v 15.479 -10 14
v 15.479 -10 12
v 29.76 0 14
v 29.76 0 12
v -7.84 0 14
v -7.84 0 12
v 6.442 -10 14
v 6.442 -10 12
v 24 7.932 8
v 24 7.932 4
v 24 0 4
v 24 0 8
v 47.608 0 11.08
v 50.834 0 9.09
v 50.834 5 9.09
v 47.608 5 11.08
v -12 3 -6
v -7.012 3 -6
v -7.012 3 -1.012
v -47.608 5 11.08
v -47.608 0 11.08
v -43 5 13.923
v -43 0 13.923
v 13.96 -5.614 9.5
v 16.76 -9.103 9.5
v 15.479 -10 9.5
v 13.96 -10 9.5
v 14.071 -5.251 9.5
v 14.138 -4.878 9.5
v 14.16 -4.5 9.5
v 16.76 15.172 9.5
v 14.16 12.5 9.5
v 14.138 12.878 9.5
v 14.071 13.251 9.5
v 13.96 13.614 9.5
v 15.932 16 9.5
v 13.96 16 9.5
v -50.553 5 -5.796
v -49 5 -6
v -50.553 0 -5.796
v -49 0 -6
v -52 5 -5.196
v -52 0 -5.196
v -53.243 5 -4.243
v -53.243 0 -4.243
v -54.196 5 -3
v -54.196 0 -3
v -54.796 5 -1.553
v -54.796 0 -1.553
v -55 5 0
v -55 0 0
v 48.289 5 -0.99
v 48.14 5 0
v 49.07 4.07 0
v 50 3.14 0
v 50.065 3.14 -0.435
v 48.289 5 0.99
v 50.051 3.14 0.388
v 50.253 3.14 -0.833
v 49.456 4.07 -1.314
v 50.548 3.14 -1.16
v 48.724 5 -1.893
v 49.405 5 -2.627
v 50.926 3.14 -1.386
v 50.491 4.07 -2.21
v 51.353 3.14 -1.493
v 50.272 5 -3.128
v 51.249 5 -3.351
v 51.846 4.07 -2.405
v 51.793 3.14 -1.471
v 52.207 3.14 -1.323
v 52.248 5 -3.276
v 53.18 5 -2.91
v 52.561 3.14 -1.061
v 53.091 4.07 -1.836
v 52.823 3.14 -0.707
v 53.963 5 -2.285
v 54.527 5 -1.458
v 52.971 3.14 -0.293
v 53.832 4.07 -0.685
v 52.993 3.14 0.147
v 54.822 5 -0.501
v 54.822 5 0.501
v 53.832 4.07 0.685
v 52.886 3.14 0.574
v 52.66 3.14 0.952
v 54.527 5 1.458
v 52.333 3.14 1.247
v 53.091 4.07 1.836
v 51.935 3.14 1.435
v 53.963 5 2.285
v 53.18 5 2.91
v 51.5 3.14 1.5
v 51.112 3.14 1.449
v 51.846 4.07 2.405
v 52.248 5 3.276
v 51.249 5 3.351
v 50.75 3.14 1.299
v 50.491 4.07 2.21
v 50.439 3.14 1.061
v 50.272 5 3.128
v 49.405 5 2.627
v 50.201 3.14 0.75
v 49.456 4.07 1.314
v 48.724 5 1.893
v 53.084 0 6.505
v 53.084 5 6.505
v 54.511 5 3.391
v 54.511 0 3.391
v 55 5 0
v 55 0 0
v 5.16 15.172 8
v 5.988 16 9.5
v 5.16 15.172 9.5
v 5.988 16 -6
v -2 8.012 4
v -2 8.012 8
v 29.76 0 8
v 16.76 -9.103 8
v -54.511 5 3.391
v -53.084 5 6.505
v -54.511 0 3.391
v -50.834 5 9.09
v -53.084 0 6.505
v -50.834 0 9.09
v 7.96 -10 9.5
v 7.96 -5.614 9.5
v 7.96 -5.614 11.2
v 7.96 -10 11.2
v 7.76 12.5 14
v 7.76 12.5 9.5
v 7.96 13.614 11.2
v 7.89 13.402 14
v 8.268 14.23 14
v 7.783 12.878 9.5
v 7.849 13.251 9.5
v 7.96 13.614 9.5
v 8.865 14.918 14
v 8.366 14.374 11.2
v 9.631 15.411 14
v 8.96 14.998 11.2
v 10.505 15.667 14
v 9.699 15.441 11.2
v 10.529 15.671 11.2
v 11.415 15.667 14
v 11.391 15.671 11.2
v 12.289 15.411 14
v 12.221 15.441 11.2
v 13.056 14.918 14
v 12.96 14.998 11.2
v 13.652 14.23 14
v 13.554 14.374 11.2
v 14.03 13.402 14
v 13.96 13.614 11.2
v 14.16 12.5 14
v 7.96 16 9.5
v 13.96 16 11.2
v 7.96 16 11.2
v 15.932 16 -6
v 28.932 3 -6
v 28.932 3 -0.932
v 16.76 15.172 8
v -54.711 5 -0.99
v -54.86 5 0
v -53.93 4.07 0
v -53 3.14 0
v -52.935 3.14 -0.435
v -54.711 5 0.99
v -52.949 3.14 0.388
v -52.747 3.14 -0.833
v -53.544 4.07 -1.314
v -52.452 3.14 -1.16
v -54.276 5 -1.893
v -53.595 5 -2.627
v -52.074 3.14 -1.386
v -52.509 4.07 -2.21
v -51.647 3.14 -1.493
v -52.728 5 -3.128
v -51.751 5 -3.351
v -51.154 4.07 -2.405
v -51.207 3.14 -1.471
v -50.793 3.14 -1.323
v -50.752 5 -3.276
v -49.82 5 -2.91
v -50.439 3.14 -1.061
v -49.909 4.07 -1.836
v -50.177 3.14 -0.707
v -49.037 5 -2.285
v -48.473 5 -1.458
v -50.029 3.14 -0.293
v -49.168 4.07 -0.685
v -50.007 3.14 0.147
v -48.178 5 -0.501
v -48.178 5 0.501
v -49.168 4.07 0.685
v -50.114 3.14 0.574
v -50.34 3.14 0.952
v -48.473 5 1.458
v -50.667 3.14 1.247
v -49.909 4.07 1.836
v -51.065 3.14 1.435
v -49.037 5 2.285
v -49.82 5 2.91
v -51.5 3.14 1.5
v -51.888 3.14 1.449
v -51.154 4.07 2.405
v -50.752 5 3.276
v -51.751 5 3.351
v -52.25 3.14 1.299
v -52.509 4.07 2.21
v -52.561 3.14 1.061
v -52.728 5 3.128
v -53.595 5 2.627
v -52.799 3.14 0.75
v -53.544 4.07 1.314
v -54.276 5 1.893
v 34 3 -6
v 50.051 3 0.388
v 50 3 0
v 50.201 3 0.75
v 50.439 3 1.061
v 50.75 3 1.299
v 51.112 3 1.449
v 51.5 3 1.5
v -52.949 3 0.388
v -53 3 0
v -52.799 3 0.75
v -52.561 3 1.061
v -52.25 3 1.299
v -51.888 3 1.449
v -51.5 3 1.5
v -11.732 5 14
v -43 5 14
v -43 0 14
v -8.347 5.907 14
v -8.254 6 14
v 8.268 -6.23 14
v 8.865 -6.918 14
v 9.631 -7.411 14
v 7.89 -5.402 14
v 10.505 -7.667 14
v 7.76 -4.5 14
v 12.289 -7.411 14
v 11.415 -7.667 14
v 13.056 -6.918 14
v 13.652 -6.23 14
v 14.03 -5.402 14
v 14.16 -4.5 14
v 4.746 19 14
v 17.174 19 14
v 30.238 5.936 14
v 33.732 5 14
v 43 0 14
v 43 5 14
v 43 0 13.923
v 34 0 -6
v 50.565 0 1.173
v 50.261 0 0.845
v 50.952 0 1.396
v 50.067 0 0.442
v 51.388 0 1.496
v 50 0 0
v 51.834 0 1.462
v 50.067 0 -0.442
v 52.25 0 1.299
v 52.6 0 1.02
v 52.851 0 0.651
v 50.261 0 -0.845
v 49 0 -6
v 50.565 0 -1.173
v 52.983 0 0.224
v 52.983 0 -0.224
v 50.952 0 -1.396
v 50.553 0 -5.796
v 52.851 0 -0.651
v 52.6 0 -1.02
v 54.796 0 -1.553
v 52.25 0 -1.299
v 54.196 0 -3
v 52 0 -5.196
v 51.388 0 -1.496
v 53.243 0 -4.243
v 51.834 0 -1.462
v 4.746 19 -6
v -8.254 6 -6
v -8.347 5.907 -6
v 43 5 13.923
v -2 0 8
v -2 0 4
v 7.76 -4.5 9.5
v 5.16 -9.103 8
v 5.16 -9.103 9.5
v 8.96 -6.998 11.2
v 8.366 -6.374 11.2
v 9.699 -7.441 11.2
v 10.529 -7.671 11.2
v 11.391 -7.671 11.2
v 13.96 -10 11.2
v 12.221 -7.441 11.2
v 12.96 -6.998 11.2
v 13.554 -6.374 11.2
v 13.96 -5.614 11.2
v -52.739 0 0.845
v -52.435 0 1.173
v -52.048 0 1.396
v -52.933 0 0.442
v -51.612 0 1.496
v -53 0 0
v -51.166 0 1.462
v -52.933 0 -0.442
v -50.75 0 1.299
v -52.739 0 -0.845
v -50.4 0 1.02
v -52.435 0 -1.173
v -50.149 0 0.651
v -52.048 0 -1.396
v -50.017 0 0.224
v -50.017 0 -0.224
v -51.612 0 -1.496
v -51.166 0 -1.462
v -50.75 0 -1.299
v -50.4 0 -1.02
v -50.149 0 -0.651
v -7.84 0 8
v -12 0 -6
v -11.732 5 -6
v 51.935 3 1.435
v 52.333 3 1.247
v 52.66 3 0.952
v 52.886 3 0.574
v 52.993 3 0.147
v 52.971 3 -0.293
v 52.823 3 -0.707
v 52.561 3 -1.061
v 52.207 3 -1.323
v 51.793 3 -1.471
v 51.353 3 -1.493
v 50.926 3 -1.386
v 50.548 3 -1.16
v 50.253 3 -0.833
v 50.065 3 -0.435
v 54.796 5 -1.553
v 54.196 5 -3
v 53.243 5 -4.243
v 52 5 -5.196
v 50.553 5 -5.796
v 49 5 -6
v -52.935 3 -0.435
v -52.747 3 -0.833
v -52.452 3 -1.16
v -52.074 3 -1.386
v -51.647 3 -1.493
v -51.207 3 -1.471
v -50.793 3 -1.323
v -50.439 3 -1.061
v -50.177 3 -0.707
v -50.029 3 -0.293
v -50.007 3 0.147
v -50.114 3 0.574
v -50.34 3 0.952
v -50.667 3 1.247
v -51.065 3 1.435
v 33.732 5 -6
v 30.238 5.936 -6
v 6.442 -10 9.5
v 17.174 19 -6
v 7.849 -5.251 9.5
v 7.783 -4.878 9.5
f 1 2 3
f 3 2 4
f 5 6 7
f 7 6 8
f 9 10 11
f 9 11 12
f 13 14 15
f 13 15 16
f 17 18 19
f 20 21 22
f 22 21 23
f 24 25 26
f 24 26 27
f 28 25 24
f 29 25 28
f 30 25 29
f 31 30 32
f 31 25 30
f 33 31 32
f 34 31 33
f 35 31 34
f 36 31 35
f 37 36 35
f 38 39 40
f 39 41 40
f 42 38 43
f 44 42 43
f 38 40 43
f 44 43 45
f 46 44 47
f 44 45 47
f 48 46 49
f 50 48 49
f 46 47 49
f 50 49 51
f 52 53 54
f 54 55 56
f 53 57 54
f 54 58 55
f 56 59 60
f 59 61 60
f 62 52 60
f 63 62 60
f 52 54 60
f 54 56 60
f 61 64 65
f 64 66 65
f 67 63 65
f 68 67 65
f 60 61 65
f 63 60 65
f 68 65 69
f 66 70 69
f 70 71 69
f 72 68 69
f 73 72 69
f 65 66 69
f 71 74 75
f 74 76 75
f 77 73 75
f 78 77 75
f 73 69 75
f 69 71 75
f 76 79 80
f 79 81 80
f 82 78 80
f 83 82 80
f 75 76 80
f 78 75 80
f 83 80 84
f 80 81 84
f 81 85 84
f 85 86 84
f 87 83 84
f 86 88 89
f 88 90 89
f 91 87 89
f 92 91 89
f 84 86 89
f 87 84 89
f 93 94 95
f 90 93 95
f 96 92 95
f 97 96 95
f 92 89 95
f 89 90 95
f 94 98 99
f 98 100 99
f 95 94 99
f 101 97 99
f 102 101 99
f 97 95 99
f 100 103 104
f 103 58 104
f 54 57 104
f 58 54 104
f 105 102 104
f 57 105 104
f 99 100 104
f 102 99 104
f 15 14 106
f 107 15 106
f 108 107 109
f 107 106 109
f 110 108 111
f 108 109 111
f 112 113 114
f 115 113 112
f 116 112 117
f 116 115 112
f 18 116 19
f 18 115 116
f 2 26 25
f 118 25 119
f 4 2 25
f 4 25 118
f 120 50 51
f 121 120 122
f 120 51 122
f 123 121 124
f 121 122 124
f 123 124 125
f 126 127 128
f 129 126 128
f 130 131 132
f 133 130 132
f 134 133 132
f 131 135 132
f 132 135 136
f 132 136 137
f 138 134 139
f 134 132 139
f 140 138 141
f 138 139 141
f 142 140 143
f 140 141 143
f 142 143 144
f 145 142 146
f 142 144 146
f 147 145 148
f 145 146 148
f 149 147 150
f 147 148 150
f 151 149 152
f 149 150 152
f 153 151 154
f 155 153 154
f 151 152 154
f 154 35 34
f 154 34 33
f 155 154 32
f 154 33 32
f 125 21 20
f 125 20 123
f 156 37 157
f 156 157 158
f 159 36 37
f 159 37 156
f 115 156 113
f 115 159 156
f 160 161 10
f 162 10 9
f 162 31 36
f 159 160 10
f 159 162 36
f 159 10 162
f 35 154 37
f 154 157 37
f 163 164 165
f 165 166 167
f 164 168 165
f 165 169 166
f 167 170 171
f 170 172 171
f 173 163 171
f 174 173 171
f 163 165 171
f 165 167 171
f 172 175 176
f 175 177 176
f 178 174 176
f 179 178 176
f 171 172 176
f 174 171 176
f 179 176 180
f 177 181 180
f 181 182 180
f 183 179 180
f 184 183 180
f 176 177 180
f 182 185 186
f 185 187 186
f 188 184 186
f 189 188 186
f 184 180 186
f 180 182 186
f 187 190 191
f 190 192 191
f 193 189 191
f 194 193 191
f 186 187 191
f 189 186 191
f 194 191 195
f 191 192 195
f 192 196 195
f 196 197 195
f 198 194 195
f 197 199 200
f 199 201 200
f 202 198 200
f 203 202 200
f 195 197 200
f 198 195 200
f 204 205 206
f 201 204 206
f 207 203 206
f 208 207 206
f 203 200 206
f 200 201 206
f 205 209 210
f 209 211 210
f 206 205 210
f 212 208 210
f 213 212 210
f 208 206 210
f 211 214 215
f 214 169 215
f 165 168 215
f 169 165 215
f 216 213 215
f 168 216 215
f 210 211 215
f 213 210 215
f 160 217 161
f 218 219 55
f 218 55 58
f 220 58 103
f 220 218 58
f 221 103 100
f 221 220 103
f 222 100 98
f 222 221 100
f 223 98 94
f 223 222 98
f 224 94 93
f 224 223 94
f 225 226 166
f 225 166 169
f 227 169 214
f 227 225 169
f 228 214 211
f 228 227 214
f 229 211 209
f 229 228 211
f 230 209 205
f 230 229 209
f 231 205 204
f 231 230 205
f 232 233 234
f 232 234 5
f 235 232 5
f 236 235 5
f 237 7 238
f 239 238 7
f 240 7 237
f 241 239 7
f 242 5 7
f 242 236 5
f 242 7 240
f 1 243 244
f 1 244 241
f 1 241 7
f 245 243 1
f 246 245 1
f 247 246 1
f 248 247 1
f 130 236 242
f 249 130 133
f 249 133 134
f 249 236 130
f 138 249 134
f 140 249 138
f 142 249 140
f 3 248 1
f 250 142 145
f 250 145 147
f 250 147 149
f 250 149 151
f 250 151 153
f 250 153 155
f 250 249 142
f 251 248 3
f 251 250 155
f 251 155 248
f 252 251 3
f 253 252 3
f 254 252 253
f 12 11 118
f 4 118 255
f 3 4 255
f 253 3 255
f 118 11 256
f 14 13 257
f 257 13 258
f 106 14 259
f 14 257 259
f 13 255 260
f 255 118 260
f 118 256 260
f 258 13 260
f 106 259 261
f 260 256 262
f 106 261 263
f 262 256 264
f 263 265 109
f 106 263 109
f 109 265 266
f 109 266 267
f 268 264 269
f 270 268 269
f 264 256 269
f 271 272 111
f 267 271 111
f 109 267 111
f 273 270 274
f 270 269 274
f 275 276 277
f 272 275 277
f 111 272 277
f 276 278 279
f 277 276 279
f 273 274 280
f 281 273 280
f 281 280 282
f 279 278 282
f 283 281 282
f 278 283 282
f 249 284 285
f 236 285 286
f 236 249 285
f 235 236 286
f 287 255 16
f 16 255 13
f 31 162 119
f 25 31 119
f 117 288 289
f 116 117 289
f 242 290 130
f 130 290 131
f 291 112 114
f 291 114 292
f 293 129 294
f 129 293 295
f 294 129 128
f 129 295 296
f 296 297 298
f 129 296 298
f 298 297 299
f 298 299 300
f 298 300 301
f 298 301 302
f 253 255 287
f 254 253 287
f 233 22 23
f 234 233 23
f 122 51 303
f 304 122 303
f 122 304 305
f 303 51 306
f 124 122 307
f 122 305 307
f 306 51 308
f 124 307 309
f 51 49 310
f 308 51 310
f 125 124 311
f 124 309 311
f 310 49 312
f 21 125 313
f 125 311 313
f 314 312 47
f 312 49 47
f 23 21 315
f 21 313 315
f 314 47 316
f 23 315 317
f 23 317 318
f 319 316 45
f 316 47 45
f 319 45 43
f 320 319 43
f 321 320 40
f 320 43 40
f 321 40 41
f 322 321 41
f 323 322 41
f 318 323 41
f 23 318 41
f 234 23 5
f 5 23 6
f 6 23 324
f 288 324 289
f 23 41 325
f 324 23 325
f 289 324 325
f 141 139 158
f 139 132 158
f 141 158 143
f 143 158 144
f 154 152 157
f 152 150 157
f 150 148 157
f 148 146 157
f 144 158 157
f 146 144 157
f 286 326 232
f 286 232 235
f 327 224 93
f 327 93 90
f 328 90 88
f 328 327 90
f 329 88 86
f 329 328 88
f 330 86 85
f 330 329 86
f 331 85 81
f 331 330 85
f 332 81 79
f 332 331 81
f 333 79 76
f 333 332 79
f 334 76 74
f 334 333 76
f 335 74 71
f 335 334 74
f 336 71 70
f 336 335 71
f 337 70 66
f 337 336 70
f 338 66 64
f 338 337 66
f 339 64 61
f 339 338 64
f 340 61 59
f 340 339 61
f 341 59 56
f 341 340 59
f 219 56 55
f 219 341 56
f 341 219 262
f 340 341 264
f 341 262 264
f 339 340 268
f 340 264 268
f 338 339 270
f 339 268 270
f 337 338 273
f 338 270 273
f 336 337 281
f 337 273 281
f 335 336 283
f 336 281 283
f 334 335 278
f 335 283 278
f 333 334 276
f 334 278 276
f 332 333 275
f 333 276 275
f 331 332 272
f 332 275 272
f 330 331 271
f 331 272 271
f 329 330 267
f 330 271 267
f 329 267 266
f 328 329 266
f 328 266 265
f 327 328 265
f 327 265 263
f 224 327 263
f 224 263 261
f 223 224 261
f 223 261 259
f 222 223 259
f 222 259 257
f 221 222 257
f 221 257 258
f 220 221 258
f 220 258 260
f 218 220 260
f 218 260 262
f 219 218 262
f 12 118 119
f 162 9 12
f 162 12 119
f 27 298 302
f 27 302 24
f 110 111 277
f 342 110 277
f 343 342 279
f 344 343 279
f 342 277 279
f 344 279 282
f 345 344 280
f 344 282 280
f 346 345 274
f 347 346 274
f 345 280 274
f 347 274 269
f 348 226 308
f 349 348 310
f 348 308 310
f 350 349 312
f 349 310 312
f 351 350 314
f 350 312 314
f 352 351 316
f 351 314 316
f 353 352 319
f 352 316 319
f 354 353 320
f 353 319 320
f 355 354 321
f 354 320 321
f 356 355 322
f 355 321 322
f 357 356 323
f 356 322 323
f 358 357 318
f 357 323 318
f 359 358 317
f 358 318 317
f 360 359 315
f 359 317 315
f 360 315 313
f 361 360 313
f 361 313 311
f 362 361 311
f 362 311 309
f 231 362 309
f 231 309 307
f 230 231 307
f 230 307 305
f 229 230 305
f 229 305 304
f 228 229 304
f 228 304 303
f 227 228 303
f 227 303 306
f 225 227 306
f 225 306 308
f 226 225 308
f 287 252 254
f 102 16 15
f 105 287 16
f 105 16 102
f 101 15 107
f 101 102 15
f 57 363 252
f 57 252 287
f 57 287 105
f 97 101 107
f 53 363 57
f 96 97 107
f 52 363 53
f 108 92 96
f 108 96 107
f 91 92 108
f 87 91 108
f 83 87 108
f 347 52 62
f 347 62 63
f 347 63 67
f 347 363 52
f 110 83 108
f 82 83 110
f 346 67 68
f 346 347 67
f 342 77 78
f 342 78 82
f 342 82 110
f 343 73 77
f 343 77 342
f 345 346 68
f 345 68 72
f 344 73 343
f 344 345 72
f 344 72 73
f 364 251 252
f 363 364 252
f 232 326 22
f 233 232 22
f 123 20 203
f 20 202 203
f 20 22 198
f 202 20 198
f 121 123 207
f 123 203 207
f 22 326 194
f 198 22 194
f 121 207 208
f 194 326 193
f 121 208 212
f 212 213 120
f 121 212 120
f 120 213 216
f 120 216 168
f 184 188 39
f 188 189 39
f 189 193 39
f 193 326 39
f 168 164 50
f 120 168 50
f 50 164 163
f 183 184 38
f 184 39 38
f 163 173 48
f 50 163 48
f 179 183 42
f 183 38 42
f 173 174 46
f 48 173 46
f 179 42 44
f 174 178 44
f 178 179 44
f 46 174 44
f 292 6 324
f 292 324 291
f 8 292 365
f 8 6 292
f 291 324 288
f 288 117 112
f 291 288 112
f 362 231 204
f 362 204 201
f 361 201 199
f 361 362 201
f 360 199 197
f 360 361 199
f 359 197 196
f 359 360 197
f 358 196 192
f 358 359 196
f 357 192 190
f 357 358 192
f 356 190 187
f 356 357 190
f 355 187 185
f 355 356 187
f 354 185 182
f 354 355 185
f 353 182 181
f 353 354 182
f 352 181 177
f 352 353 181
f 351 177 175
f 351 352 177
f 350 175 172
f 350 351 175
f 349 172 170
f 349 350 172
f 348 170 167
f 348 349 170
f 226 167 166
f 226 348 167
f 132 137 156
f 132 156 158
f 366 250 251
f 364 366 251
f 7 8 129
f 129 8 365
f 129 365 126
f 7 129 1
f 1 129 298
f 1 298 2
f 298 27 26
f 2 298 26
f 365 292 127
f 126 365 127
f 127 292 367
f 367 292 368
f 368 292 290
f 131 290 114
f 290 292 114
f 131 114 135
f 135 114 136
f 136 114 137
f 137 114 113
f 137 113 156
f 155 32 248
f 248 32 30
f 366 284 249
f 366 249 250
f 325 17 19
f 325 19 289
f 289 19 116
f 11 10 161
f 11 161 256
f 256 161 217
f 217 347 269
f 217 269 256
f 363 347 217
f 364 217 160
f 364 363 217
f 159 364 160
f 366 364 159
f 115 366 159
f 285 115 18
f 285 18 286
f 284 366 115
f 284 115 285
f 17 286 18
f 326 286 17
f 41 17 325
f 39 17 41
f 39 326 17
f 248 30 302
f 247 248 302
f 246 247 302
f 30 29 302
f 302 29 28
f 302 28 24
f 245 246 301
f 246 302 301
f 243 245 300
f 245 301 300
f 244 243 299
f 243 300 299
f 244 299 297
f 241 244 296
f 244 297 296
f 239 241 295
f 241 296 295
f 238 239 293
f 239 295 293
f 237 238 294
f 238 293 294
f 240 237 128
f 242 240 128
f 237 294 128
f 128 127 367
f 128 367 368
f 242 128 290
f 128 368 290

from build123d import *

# Parameters (mm, degrees)
BOSS_EXTRUDE1_DEPTH           = 3
CUT_EXTRUDE1_DEPTH            = 10
CUT_EXTRUDE3_START            = 8
SKETCH8_W                     = 6
SKETCH8_H                     = 3
CUT_EXTRUDE3_DEPTH            = 6
BOSS_EXTRUDE4_START           = 18
BOSS_EXTRUDE4_DEPTH           = 28
BOSS_EXTRUDE5_DEPTH           = 3
CUT_EXTRUDE4_DEPTH            = 3
CUT_EXTRUDE5_DEPTH            = 10
SKETCH18_R                    = 1.5
BOSS_EXTRUDE9_DEPTH           = 2
CHAMFER1_SIZE                 = 15
CHAMFER2_SIZE                 = 15
CHAMFER2_SIZE_2               = 10.503113073
CUT_EXTRUDE6_DEPTH            = 5
BOSS_EXTRUDE8_DEPTH           = 2
CHAMFER3_DEPTH                = 6
CHAMFER3_2_DEPTH              = 5
CSK_FOR_M3_SFHCS1_D           = 3
CSK_FOR_M3_SFHCS1_DEPTH       = 31.098709071
CSK_FOR_M3_SFHCS1_CSINK_D     = 6.72
CSK_FOR_M3_SFHCS1_CSINK_ANGLE = 90
CSK_FOR_M3_SFHCS1_TIP         = 0.901290929
CUT_EXTRUDE7_DEPTH            = 1.5
BOSS_EXTRUDE10_START          = -6
BOSS_EXTRUDE10_DEPTH          = 20
CHAMFER4_SIZE                 = 1.07179677
CHAMFER4_SIZE_2               = 4


with BuildPart() as part:
    # Sketch1 → Boss-Extrude1 (new body)
    with BuildSketch(Plane(origin=(0, 0, 0), x_dir=(1, 0, 0), z_dir=(0, 1, 0))):
        with BuildLine():
            ThreePointArc((-49, -6), (-53.242640687, -4.242640687), (-55, 0))
            ThreePointArc((-55, 0), (-51.485281374, -8.485281374), (-43, -12))
            Line((-43, -12), (43, -12))
            ThreePointArc((43, -12), (51.485281374, -8.485281374), (55, 0))
            ThreePointArc((55, 0), (53.242640687, -4.242640687), (49, -6))
            Line((49, -6), (-49, -6))
        make_face()
        with BuildLine():
            Line((-53, 0), (-55, 0))
            ThreePointArc((-55, 0), (-53.242640687, -4.242640687), (-49, -6))
            Line((-49, -6), (49, -6))
            ThreePointArc((49, -6), (53.242640687, -4.242640687), (55, 0))
            Line((55, 0), (53, 0))
            ThreePointArc((53, 0), (51.5, -1.5), (50, 0))
            Line((50, 0), (-50, 0))
            ThreePointArc((-50, 0), (-51.5, -1.5), (-53, 0))
        make_face()
        with BuildLine():
            Line((49, 6), (-49, 6))
            ThreePointArc((-49, 6), (-53.242640687, 4.242640687), (-55, 0))
            Line((-55, 0), (-53, 0))
            ThreePointArc((-53, 0), (-51.5, 1.5), (-50, 0))
            Line((-50, 0), (50, 0))
            ThreePointArc((50, 0), (51.5, 1.5), (53, 0))
            Line((53, 0), (55, 0))
            ThreePointArc((55, 0), (53.242640687, 4.242640687), (49, 6))
        make_face()
    extrude(amount=BOSS_EXTRUDE1_DEPTH)

    # Sketch2 → Cut-Extrude1 (cut)
    with BuildSketch(Plane(origin=(0, 3, 0), x_dir=(1, 0, 0), z_dir=(0, 1, 0))):
        Polygon((22, -8), (36, 6), (-14, 6), (0, -8), align=None)
    extrude(amount=-CUT_EXTRUDE1_DEPTH, mode=Mode.SUBTRACT)

    # Sketch8 → Cut-Extrude3 (cut)
    with BuildSketch(Plane.XY.offset(CUT_EXTRUDE3_START)):
        with Locations((10.960071178, 1.5)):
            Rectangle(SKETCH8_W, SKETCH8_H)
    extrude(amount=CUT_EXTRUDE3_DEPTH, mode=Mode.SUBTRACT)


with BuildPart() as cut_extrude3_piece_1:
    # of the separate pieces the step leaves, piece 1, a body of its own (cut_extrude3_pieces)
    add(part.part.solids().sort_by_distance((-55, 0, 0))[0])

    # Sketch9 → Boss-Extrude4 (add)
    with BuildSketch(Plane(origin=(0, 0, 0), x_dir=(1, 0, 0), z_dir=(0, 1, 0)).offset(BOSS_EXTRUDE4_START)):
        Polygon((13.960071178, -11.2), (13.960071178, -8), (14.760071178, -8), (14.760071178, -12), (7.160071178, -12), (7.160071178, -8), (7.960071178, -8), (7.960071178, -11.2), align=None)
    extrude(amount=-BOSS_EXTRUDE4_DEPTH)


with BuildPart() as cut_extrude3_piece_2:
    # of the separate pieces the step leaves, piece 2, a body of its own (cut_extrude3_pieces)
    add(part.part.solids().sort_by_distance((13.960071178, 0, 12))[0])


with BuildPart() as cut_extrude3_piece_1_1:
    add(cut_extrude3_piece_1.part)

    # Combine1: union Cut-Extrude3 piece 2
    add(cut_extrude3_piece_2.part)

    # Sketch11 → Boss-Extrude5 (add)
    with BuildSketch(Plane(origin=(0, 3, 0), x_dir=(1, 0, 0), z_dir=(0, 1, 0))):
        Polygon((-14, 6), (-12, 6), (2, -8), (0, -8), align=None)
        Polygon((20, -8), (34, 6), (36, 6), (22, -8), align=None)
    extrude(amount=-BOSS_EXTRUDE5_DEPTH)

    # Sketch13 → Cut-Extrude4 (cut)
    with BuildSketch(Plane(origin=(0, 3, 0), x_dir=(1, 0, 0), z_dir=(0, 1, 0))):
        Polygon((2, -8), (-2, -8), (-2, -4), align=None)
        Polygon((24, -4), (24, -8), (20, -8), align=None)
    extrude(amount=-CUT_EXTRUDE4_DEPTH, mode=Mode.SUBTRACT)

    # Sketch15 → Cut-Extrude5 (cut)
    with BuildSketch(Plane.XY.offset(12)):
        with BuildLine():
            Line((14.160071178, 12.5), (14.160071178, -4.5))
            ThreePointArc((14.160071178, -4.5), (10.960071178, -7.7), (7.760071178, -4.5))
            Line((7.760071178, -4.5), (7.760071178, 12.5))
            ThreePointArc((7.760071178, 12.5), (10.960071178, 15.7), (14.160071178, 12.5))
        make_face()
    extrude(amount=-CUT_EXTRUDE5_DEPTH, mode=Mode.SUBTRACT)

    # Sketch18 → Boss-Extrude9 (add)
    # profile 1 of 2: a face of its own
    with BuildSketch(Plane(origin=(0, 3, 0), x_dir=(1, 0, 0), z_dir=(0, 1, 0))):
        with BuildLine():
            Line((7.160071178, -8), (-2, -8))
            Line((-2, -8), (-2, -4))
            Line((-2, -4), (-12, 6))
            Line((-12, 6), (-49, 6))
            ThreePointArc((-49, 6), (-53.242640687, 4.242640687), (-55, 0))
            ThreePointArc((-55, 0), (-51.485281374, -8.485281374), (-43, -12))
            Line((-43, -12), (7.160071178, -12))
            Line((7.160071178, -12), (7.160071178, -8))
        make_face()
        with Locations(Location((-51.5, 0, 0), (0, 0, 270))):
            Circle(SKETCH18_R, mode=Mode.SUBTRACT)
    # profile 2 of 2: a face of its own
    with BuildSketch(Plane(origin=(0, 3, 0), x_dir=(1, 0, 0), z_dir=(0, 1, 0))):
        with BuildLine():
            Line((24, -4), (24, -8))
            Line((24, -8), (14.760071178, -8))
            Line((14.760071178, -8), (14.760071178, -12))
            Line((14.760071178, -12), (43, -12))
            ThreePointArc((43, -12), (51.485281374, -8.485281374), (55, 0))
            ThreePointArc((55, 0), (53.242640687, 4.242640687), (49, 6))
            Line((49, 6), (34, 6))
            Line((34, 6), (24, -4))
        make_face()
        with Locations(Location((51.5, 0, 0), (0, 0, 270))):
            Circle(SKETCH18_R, mode=Mode.SUBTRACT)
    extrude(amount=BOSS_EXTRUDE9_DEPTH)

    # Chamfer1
    # the kernel refuses this chamfer: 15 mm, written as the material it adds along each edge
    with BuildSketch(Plane(origin=(14.760071178, 5, 8), x_dir=(0, 1, 0), z_dir=(0, 0, 1))) as chamfer1_piece_1_section:
        Polygon((CHAMFER1_SIZE, 0), (0, -CHAMFER1_SIZE), (0, 0), align=None)
    chamfer1_piece_1 = extrude(amount=4, mode=Mode.PRIVATE)
    chamfer1_piece_1 = split(chamfer1_piece_1, bisect_by=Plane(origin=(14.760071178, 18, 8), z_dir=(0, -1, 0)), keep=Keep.TOP, mode=Mode.PRIVATE)
    chamfer1_piece_1 = split(chamfer1_piece_1, bisect_by=Plane(origin=(17.380035589, 5, 10.619964411), z_dir=(-0.7071067811865474, 0, -0.7071067811865477)), keep=Keep.TOP, mode=Mode.PRIVATE)
    add(chamfer1_piece_1)
    with BuildSketch(Plane(origin=(14.760071178, 5, -30.575244819), x_dir=(0, 1, 0), z_dir=(0, 0, 1))) as chamfer1_piece_2_section:
        Polygon((CHAMFER1_SIZE, 0), (0, -CHAMFER1_SIZE), (0, 0), align=None)
    chamfer1_piece_2 = extrude(amount=42.575244819, mode=Mode.PRIVATE)
    chamfer1_piece_2 = split(chamfer1_piece_2, bisect_by=Plane(origin=(14.760071178, 5, 8), z_dir=(0, 0, -1)), keep=Keep.TOP, mode=Mode.PRIVATE)
    chamfer1_piece_2 = split(chamfer1_piece_2, bisect_by=Plane(origin=(36.667657999, 5, -8.667657999), z_dir=(0.7071067811865474, 0, 0.7071067811865477)), keep=Keep.TOP, mode=Mode.PRIVATE)
    chamfer1_piece_2 = split(chamfer1_piece_2, bisect_by=Plane(origin=(24, 5, -30.575244819), z_dir=(1, 0, 0)), keep=Keep.TOP, mode=Mode.PRIVATE)
    add(chamfer1_piece_2)
    with BuildSketch(Plane(origin=(14.760071178, 5, 8), x_dir=(0, 1, 0), z_dir=(0, 0, 1))) as chamfer1_piece_3_section:
        Polygon((CHAMFER1_SIZE, 0), (0, -CHAMFER1_SIZE), (0, 0), align=None)
    chamfer1_piece_3 = extrude(amount=4, mode=Mode.PRIVATE)
    chamfer1_piece_3 = split(chamfer1_piece_3, bisect_by=Plane(origin=(14.760071178, 18, 8), z_dir=(0, -1, 0)), keep=Keep.TOP, mode=Mode.PRIVATE)
    chamfer1_piece_3 = split(chamfer1_piece_3, bisect_by=Plane(origin=(17.380035589, 5, 10.619964411), z_dir=(0.7071067811865474, 0, 0.7071067811865477)), keep=Keep.TOP, mode=Mode.PRIVATE)
    chamfer1_piece_3 = split(chamfer1_piece_3, bisect_by=Plane(origin=(24, 5, 8), z_dir=(-1, 0, 0)), keep=Keep.TOP, mode=Mode.PRIVATE)
    add(chamfer1_piece_3)
    with BuildSketch(Plane(origin=(14.760071178, 5, 8), x_dir=(0, 1, 0), z_dir=(0, 0, 1))) as chamfer1_piece_4_section:
        Polygon((CHAMFER1_SIZE, 0), (0, -CHAMFER1_SIZE), (0, 0), align=None)
    chamfer1_piece_4 = extrude(amount=4, mode=Mode.PRIVATE)
    chamfer1_piece_4 = split(chamfer1_piece_4, bisect_by=Plane(origin=(24, 5, 8), z_dir=(1, 0, 0)), keep=Keep.TOP, mode=Mode.PRIVATE)
    add(chamfer1_piece_4)
    with BuildSketch(Plane(origin=(7.160071178, 5, 12), x_dir=(0, 1, 0), z_dir=(0, 0, -1))) as chamfer1_piece_5_section:
        Polygon((CHAMFER1_SIZE, 0), (0, -CHAMFER1_SIZE), (0, 0), align=None)
    chamfer1_piece_5 = extrude(amount=4, mode=Mode.PRIVATE)
    chamfer1_piece_5 = split(chamfer1_piece_5, bisect_by=Plane(origin=(6.580035589, 5, 12.580035589), z_dir=(-0.7071067811865489, 0, 0.7071067811865461)), keep=Keep.TOP, mode=Mode.PRIVATE)
    chamfer1_piece_5 = split(chamfer1_piece_5, bisect_by=Plane(origin=(-2, 5, 12), z_dir=(1, 0, 0)), keep=Keep.TOP, mode=Mode.PRIVATE)
    chamfer1_piece_5 = split(chamfer1_piece_5, bisect_by=Plane(origin=(7.160071178, 18, 12), z_dir=(0, -1, 0)), keep=Keep.TOP, mode=Mode.PRIVATE)
    add(chamfer1_piece_5)
    with BuildSketch(Plane(origin=(7.160071178, 5, 12), x_dir=(0, 1, 0), z_dir=(0, 0, -1))) as chamfer1_piece_6_section:
        Polygon((CHAMFER1_SIZE, 0), (0, -CHAMFER1_SIZE), (0, 0), align=None)
    chamfer1_piece_6 = extrude(amount=4, mode=Mode.PRIVATE)
    chamfer1_piece_6 = split(chamfer1_piece_6, bisect_by=Plane(origin=(-2, 5, 12), z_dir=(-1, 0, 0)), keep=Keep.TOP, mode=Mode.PRIVATE)
    add(chamfer1_piece_6)
    with BuildSketch(Plane(origin=(7.160071178, 5, 12), x_dir=(0, 1, 0), z_dir=(0, 0, -1))) as chamfer1_piece_7_section:
        Polygon((CHAMFER1_SIZE, 0), (0, -CHAMFER1_SIZE), (0, 0), align=None)
    chamfer1_piece_7 = extrude(amount=4, mode=Mode.PRIVATE)
    chamfer1_piece_7 = split(chamfer1_piece_7, bisect_by=Plane(origin=(6.580035589, 5, 12.580035589), z_dir=(0.7071067811865489, 0, -0.7071067811865461)), keep=Keep.TOP, mode=Mode.PRIVATE)
    chamfer1_piece_7 = split(chamfer1_piece_7, bisect_by=Plane(origin=(7.160071178, 18, 12), z_dir=(0, -1, 0)), keep=Keep.TOP, mode=Mode.PRIVATE)
    add(chamfer1_piece_7)
    with BuildSketch(Plane(origin=(7.160071178, 5, 12), x_dir=(0, 1, 0), z_dir=(0, 0, -1))) as chamfer1_piece_8_section:
        Polygon((CHAMFER1_SIZE, 0), (0, -CHAMFER1_SIZE), (0, 0), align=None)
    chamfer1_piece_8 = extrude(amount=42.575244819, mode=Mode.PRIVATE)
    chamfer1_piece_8 = split(chamfer1_piece_8, bisect_by=Plane(origin=(6.580035589, 5, 12.580035589), z_dir=(-0.7071067811865489, 0, 0.7071067811865461)), keep=Keep.TOP, mode=Mode.PRIVATE)
    chamfer1_piece_8 = split(chamfer1_piece_8, bisect_by=Plane(origin=(-2, 5, 12), z_dir=(-1, 0, 0)), keep=Keep.TOP, mode=Mode.PRIVATE)
    chamfer1_piece_8 = split(chamfer1_piece_8, bisect_by=Plane(origin=(7.160071178, 5, 8), z_dir=(0, 0, -1)), keep=Keep.TOP, mode=Mode.PRIVATE)
    add(chamfer1_piece_8)

    # Chamfer2
    # the kernel refuses this chamfer: 15, 10.503113073 mm, written as the material it adds along each edge
    with BuildSketch(Plane(origin=(7.160071178, 0, 12), x_dir=(-1, 0, 0), z_dir=(0, 0, -1))) as chamfer2_piece_1_section:
        Polygon((CHAMFER2_SIZE, 0), (0, -CHAMFER2_SIZE_2), (0, 0), align=None)
    chamfer2_piece_1 = extrude(amount=4, mode=Mode.PRIVATE)
    chamfer2_piece_1 = split(chamfer2_piece_1, bisect_by=Plane(origin=(-2, 0, 12), z_dir=(-1, 0, 0)), keep=Keep.TOP, mode=Mode.PRIVATE)
    add(chamfer2_piece_1)
    with BuildSketch(Plane(origin=(7.160071178, 0, 12), x_dir=(-1, 0, 0), z_dir=(0, 0, -1))) as chamfer2_piece_2_section:
        Polygon((CHAMFER2_SIZE, 0), (0, -CHAMFER2_SIZE_2), (0, 0), align=None)
    chamfer2_piece_2 = extrude(amount=4, mode=Mode.PRIVATE)
    chamfer2_piece_2 = split(chamfer2_piece_2, bisect_by=Plane(origin=(6.580035589, 0, 12.580035589), z_dir=(-0.7071067811865476, 0, 0.7071067811865476)), keep=Keep.TOP, mode=Mode.PRIVATE)
    chamfer2_piece_2 = split(chamfer2_piece_2, bisect_by=Plane(origin=(-2, 0, 12), z_dir=(1, 0, 0)), keep=Keep.TOP, mode=Mode.PRIVATE)
    add(chamfer2_piece_2)
    with BuildSketch(Plane(origin=(7.160071178, 0, 12), x_dir=(-1, 0, 0), z_dir=(0, 0, -1))) as chamfer2_piece_3_section:
        Polygon((CHAMFER2_SIZE, 0), (0, -CHAMFER2_SIZE_2), (0, 0), align=None)
    chamfer2_piece_3 = extrude(amount=42.738283454, mode=Mode.PRIVATE)
    chamfer2_piece_3 = split(chamfer2_piece_3, bisect_by=Plane(origin=(6.580035589, 0, 12.580035589), z_dir=(-0.7071067811865476, 0, 0.7071067811865476)), keep=Keep.TOP, mode=Mode.PRIVATE)
    chamfer2_piece_3 = split(chamfer2_piece_3, bisect_by=Plane(origin=(7.160071178, 0, 8), z_dir=(0, 0, -1)), keep=Keep.TOP, mode=Mode.PRIVATE)
    chamfer2_piece_3 = split(chamfer2_piece_3, bisect_by=Plane(origin=(-2, 0, 12), z_dir=(-1, 0, 0)), keep=Keep.TOP, mode=Mode.PRIVATE)
    add(chamfer2_piece_3)
    with BuildSketch(Plane(origin=(7.160071178, 0, 12), x_dir=(-1, 0, 0), z_dir=(0, 0, -1))) as chamfer2_piece_4_section:
        Polygon((CHAMFER2_SIZE, 0), (0, -CHAMFER2_SIZE_2), (0, 0), align=None)
    chamfer2_piece_4 = extrude(amount=4, mode=Mode.PRIVATE)
    chamfer2_piece_4 = split(chamfer2_piece_4, bisect_by=Plane(origin=(6.580035589, 0, 12.580035589), z_dir=(0.7071067811865476, 0, -0.7071067811865476)), keep=Keep.TOP, mode=Mode.PRIVATE)
    chamfer2_piece_4 = split(chamfer2_piece_4, bisect_by=Plane(origin=(7.160071178, -10, 12), z_dir=(0, 1, 0)), keep=Keep.TOP, mode=Mode.PRIVATE)
    add(chamfer2_piece_4)
    with BuildSketch(Plane(origin=(14.760071178, 0, 12), x_dir=(0, -1, 0), z_dir=(0, 0, -1))) as chamfer2_piece_5_section:
        Polygon((CHAMFER2_SIZE_2, 0), (0, -CHAMFER2_SIZE), (0, 0), align=None)
    chamfer2_piece_5 = extrude(amount=4, mode=Mode.PRIVATE)
    chamfer2_piece_5 = split(chamfer2_piece_5, bisect_by=Plane(origin=(15.380035589, 0, 12.619964411), z_dir=(0.7071067811865476, 0, 0.7071067811865476)), keep=Keep.TOP, mode=Mode.PRIVATE)
    chamfer2_piece_5 = split(chamfer2_piece_5, bisect_by=Plane(origin=(24, 0, 12), z_dir=(-1, 0, 0)), keep=Keep.TOP, mode=Mode.PRIVATE)
    add(chamfer2_piece_5)
    with BuildSketch(Plane(origin=(14.760071178, 0, 12), x_dir=(0, -1, 0), z_dir=(0, 0, -1))) as chamfer2_piece_6_section:
        Polygon((CHAMFER2_SIZE_2, 0), (0, -CHAMFER2_SIZE), (0, 0), align=None)
    chamfer2_piece_6 = extrude(amount=4, mode=Mode.PRIVATE)
    chamfer2_piece_6 = split(chamfer2_piece_6, bisect_by=Plane(origin=(24, 0, 12), z_dir=(1, 0, 0)), keep=Keep.TOP, mode=Mode.PRIVATE)
    add(chamfer2_piece_6)
    with BuildSketch(Plane(origin=(14.760071178, 0, 12), x_dir=(0, -1, 0), z_dir=(0, 0, -1))) as chamfer2_piece_7_section:
        Polygon((CHAMFER2_SIZE_2, 0), (0, -CHAMFER2_SIZE), (0, 0), align=None)
    chamfer2_piece_7 = extrude(amount=4, mode=Mode.PRIVATE)
    chamfer2_piece_7 = split(chamfer2_piece_7, bisect_by=Plane(origin=(14.760071178, -10, 12), z_dir=(0, 1, 0)), keep=Keep.TOP, mode=Mode.PRIVATE)
    chamfer2_piece_7 = split(chamfer2_piece_7, bisect_by=Plane(origin=(15.380035589, 0, 12.619964411), z_dir=(-0.7071067811865476, 0, -0.7071067811865476)), keep=Keep.TOP, mode=Mode.PRIVATE)
    add(chamfer2_piece_7)
    with BuildSketch(Plane(origin=(14.760071178, 0, 12), x_dir=(0, -1, 0), z_dir=(0, 0, -1))) as chamfer2_piece_8_section:
        Polygon((CHAMFER2_SIZE_2, 0), (0, -CHAMFER2_SIZE), (0, 0), align=None)
    chamfer2_piece_8 = extrude(amount=42.738283454, mode=Mode.PRIVATE)
    chamfer2_piece_8 = split(chamfer2_piece_8, bisect_by=Plane(origin=(14.760071178, 0, 8), z_dir=(0, 0, -1)), keep=Keep.TOP, mode=Mode.PRIVATE)
    chamfer2_piece_8 = split(chamfer2_piece_8, bisect_by=Plane(origin=(15.380035589, 0, 12.619964411), z_dir=(0.7071067811865476, 0, 0.7071067811865476)), keep=Keep.TOP, mode=Mode.PRIVATE)
    chamfer2_piece_8 = split(chamfer2_piece_8, bisect_by=Plane(origin=(24, 0, 12), z_dir=(1, 0, 0)), keep=Keep.TOP, mode=Mode.PRIVATE)
    add(chamfer2_piece_8)

    # Sketch16 → Cut-Extrude6 (cut)
    with BuildSketch(Plane(origin=(0, 0, 0), x_dir=(1, 0, 0), z_dir=(0, 1, 0))):
        Polygon((-7.839928822, 1.839928822), (-2, -4), (-2, -8), (-7.839928822, -8), align=None)
        Polygon((24, -8), (24, -4), (29.760071178, 1.760071178), (29.760071178, -8), align=None)
    extrude(amount=-CUT_EXTRUDE6_DEPTH, mode=Mode.SUBTRACT)

    # Sketch17 → Boss-Extrude8 (add)
    with BuildSketch(Plane.XY.offset(12)):
        Polygon((-7.839928822, 0), (6.441551245, -10), (15.47859111, -10), (29.760071178, 0), (43, 0), (43, 5), (29.760071178, 5), (16.760071178, 18), (5.160071178, 18), (-7.839928822, 5), (-43, 5), (-43, 0), align=None)
        with BuildLine():
            Line((7.760071178, -4.5), (7.760071178, 12.5))
            ThreePointArc((7.760071178, 12.5), (10.960071178, 15.7), (14.160071178, 12.5))
            Line((14.160071178, 12.5), (14.160071178, -4.5))
            ThreePointArc((14.160071178, -4.5), (10.960071178, -7.7), (7.760071178, -4.5))
        make_face(mode=Mode.SUBTRACT)
    extrude(amount=BOSS_EXTRUDE8_DEPTH)

    # Chamfer3: read off the stored shape, not the designer's step
    # Chamfer3 outline → Chamfer3 (cut)
    with BuildSketch(Plane(origin=(0, 0, 0), x_dir=(1, 0, 0), z_dir=(0, 1, 0))):
        with BuildLine():
            ThreePointArc((47.608318931, -11.079864468), (49.300429772, -10.212961602), (50.834384089, -9.08968789))
            Line((50.834384089, -9.08968789), (47.608318931, -11.079864468))
        make_face()
        with BuildLine():
            ThreePointArc((-50.834384089, -9.08968789), (-49.300429772, -10.212961602), (-47.608318931, -11.079864468))
            Line((-47.608318931, -11.079864468), (-50.834384089, -9.08968789))
        make_face()
    extrude(amount=CHAMFER3_DEPTH, mode=Mode.SUBTRACT)

    # Chamfer3 2 outline → Chamfer3 2 (add)
    with BuildSketch(Plane(origin=(0, 0, 0), x_dir=(1, 0, 0), z_dir=(0, 1, 0))):
        with BuildLine():
            Line((43, -13.922760673), (47.608318931, -11.079864468))
            ThreePointArc((47.608318931, -11.079864468), (45.349641077, -11.767717995), (43, -12))
            Line((43, -12), (43, -13.922760673))
        make_face()
        with BuildLine():
            Line((-47.608318931, -11.079864468), (-43, -13.922760673))
            Line((-43, -13.922760673), (-43, -12))
            ThreePointArc((-43, -12), (-45.349641077, -11.767717995), (-47.608318931, -11.079864468))
        make_face()
    extrude(amount=CHAMFER3_2_DEPTH)

    # CSK for M3 SFHCS1
    with Locations(Plane(origin=(0, 5, 0), x_dir=(1, 0, 0), z_dir=(0, 1, 0))):
        with Locations((-51.5, 0), (51.5, 0)):
            CounterSinkHole(CSK_FOR_M3_SFHCS1_D / 2, CSK_FOR_M3_SFHCS1_CSINK_D / 2, depth=CSK_FOR_M3_SFHCS1_DEPTH, counter_sink_angle=CSK_FOR_M3_SFHCS1_CSINK_ANGLE)
            with Locations((0, 0, -(CSK_FOR_M3_SFHCS1_DEPTH + CSK_FOR_M3_SFHCS1_TIP / 2))):  # 118° drill point
                Cone(0, CSK_FOR_M3_SFHCS1_D / 2, CSK_FOR_M3_SFHCS1_TIP, mode=Mode.SUBTRACT)

    # Sketch21 → Cut-Extrude7 (cut)
    with BuildSketch(Plane(origin=(0, 0, 8), x_dir=(-1, 0, 0), z_dir=(0, 0, -1))):
        Polygon((-13.960071178, -10), (-13.960071178, 18), (-16.760071178, 18), (-16.760071178, -9.102697997), (-15.47859111, -10), align=None)
        Polygon((-7.960071178, -10), (-7.960071178, 18), (-5.160071178, 18), (-5.160071178, -9.102697997), (-6.441551245, -10), align=None)
    extrude(amount=-CUT_EXTRUDE7_DEPTH, mode=Mode.SUBTRACT)

    # Sketch22 → Boss-Extrude10 (add)
    with BuildSketch(Plane.XY.offset(BOSS_EXTRUDE10_START)):
        Polygon((34, 3), (28.931644053, 3), (15.931644053, 16), (5.988498302, 16), (-7.011501698, 3), (-12, 3), (-12, 6), (-8.254142385, 6), (4.745857615, 19), (17.17428474, 19), (30.17428474, 6), (34, 6), align=None)
    extrude(amount=BOSS_EXTRUDE10_DEPTH)

    # Chamfer4
    # the kernel refuses this chamfer: 4, 1.07179677 mm, written as the material it takes off along each edge
    with BuildSketch(Plane(origin=(-12, 6, -16.386886281), x_dir=(0, -1, 0), z_dir=(0, 0, 1))) as chamfer4_piece_1_section:
        Polygon((CHAMFER4_SIZE, 0), (0, CHAMFER4_SIZE_2), (0, 0), align=None)
    chamfer4_piece_1 = extrude(amount=40.773772562, mode=Mode.PRIVATE)
    chamfer4_piece_1 = split(chamfer4_piece_1, bisect_by=Plane(origin=(-12, 5, -16.386886281), z_dir=(0, 1, 0)), keep=Keep.TOP, mode=Mode.PRIVATE)
    chamfer4_piece_1 = split(chamfer4_piece_1, bisect_by=Plane(origin=(-10.127071192, 4.127071192, -16.386886281), z_dir=(-0.707106781186548, 0.7071067811865472, 0)), keep=Keep.TOP, mode=Mode.PRIVATE)
    add(chamfer4_piece_1, mode=Mode.SUBTRACT)
    with BuildSketch(Plane(origin=(34, 6, -16.386886281), x_dir=(-1, 0, 0), z_dir=(0, 0, 1))) as chamfer4_piece_2_section:
        Polygon((CHAMFER4_SIZE_2, 0), (0, CHAMFER4_SIZE), (0, 0), align=None)
    chamfer4_piece_2 = extrude(amount=40.773772562, mode=Mode.PRIVATE)
    chamfer4_piece_2 = split(chamfer4_piece_2, bisect_by=Plane(origin=(34, 5, -16.386886281), z_dir=(0, 1, 0)), keep=Keep.TOP, mode=Mode.PRIVATE)
    chamfer4_piece_2 = split(chamfer4_piece_2, bisect_by=Plane(origin=(32.08714237, 4.08714237, -16.386886281), z_dir=(0.7071067811865475, 0.7071067811865476, 0)), keep=Keep.TOP, mode=Mode.PRIVATE)
    add(chamfer4_piece_2, mode=Mode.SUBTRACT)


solid = cut_extrude3_piece_1_1.part
